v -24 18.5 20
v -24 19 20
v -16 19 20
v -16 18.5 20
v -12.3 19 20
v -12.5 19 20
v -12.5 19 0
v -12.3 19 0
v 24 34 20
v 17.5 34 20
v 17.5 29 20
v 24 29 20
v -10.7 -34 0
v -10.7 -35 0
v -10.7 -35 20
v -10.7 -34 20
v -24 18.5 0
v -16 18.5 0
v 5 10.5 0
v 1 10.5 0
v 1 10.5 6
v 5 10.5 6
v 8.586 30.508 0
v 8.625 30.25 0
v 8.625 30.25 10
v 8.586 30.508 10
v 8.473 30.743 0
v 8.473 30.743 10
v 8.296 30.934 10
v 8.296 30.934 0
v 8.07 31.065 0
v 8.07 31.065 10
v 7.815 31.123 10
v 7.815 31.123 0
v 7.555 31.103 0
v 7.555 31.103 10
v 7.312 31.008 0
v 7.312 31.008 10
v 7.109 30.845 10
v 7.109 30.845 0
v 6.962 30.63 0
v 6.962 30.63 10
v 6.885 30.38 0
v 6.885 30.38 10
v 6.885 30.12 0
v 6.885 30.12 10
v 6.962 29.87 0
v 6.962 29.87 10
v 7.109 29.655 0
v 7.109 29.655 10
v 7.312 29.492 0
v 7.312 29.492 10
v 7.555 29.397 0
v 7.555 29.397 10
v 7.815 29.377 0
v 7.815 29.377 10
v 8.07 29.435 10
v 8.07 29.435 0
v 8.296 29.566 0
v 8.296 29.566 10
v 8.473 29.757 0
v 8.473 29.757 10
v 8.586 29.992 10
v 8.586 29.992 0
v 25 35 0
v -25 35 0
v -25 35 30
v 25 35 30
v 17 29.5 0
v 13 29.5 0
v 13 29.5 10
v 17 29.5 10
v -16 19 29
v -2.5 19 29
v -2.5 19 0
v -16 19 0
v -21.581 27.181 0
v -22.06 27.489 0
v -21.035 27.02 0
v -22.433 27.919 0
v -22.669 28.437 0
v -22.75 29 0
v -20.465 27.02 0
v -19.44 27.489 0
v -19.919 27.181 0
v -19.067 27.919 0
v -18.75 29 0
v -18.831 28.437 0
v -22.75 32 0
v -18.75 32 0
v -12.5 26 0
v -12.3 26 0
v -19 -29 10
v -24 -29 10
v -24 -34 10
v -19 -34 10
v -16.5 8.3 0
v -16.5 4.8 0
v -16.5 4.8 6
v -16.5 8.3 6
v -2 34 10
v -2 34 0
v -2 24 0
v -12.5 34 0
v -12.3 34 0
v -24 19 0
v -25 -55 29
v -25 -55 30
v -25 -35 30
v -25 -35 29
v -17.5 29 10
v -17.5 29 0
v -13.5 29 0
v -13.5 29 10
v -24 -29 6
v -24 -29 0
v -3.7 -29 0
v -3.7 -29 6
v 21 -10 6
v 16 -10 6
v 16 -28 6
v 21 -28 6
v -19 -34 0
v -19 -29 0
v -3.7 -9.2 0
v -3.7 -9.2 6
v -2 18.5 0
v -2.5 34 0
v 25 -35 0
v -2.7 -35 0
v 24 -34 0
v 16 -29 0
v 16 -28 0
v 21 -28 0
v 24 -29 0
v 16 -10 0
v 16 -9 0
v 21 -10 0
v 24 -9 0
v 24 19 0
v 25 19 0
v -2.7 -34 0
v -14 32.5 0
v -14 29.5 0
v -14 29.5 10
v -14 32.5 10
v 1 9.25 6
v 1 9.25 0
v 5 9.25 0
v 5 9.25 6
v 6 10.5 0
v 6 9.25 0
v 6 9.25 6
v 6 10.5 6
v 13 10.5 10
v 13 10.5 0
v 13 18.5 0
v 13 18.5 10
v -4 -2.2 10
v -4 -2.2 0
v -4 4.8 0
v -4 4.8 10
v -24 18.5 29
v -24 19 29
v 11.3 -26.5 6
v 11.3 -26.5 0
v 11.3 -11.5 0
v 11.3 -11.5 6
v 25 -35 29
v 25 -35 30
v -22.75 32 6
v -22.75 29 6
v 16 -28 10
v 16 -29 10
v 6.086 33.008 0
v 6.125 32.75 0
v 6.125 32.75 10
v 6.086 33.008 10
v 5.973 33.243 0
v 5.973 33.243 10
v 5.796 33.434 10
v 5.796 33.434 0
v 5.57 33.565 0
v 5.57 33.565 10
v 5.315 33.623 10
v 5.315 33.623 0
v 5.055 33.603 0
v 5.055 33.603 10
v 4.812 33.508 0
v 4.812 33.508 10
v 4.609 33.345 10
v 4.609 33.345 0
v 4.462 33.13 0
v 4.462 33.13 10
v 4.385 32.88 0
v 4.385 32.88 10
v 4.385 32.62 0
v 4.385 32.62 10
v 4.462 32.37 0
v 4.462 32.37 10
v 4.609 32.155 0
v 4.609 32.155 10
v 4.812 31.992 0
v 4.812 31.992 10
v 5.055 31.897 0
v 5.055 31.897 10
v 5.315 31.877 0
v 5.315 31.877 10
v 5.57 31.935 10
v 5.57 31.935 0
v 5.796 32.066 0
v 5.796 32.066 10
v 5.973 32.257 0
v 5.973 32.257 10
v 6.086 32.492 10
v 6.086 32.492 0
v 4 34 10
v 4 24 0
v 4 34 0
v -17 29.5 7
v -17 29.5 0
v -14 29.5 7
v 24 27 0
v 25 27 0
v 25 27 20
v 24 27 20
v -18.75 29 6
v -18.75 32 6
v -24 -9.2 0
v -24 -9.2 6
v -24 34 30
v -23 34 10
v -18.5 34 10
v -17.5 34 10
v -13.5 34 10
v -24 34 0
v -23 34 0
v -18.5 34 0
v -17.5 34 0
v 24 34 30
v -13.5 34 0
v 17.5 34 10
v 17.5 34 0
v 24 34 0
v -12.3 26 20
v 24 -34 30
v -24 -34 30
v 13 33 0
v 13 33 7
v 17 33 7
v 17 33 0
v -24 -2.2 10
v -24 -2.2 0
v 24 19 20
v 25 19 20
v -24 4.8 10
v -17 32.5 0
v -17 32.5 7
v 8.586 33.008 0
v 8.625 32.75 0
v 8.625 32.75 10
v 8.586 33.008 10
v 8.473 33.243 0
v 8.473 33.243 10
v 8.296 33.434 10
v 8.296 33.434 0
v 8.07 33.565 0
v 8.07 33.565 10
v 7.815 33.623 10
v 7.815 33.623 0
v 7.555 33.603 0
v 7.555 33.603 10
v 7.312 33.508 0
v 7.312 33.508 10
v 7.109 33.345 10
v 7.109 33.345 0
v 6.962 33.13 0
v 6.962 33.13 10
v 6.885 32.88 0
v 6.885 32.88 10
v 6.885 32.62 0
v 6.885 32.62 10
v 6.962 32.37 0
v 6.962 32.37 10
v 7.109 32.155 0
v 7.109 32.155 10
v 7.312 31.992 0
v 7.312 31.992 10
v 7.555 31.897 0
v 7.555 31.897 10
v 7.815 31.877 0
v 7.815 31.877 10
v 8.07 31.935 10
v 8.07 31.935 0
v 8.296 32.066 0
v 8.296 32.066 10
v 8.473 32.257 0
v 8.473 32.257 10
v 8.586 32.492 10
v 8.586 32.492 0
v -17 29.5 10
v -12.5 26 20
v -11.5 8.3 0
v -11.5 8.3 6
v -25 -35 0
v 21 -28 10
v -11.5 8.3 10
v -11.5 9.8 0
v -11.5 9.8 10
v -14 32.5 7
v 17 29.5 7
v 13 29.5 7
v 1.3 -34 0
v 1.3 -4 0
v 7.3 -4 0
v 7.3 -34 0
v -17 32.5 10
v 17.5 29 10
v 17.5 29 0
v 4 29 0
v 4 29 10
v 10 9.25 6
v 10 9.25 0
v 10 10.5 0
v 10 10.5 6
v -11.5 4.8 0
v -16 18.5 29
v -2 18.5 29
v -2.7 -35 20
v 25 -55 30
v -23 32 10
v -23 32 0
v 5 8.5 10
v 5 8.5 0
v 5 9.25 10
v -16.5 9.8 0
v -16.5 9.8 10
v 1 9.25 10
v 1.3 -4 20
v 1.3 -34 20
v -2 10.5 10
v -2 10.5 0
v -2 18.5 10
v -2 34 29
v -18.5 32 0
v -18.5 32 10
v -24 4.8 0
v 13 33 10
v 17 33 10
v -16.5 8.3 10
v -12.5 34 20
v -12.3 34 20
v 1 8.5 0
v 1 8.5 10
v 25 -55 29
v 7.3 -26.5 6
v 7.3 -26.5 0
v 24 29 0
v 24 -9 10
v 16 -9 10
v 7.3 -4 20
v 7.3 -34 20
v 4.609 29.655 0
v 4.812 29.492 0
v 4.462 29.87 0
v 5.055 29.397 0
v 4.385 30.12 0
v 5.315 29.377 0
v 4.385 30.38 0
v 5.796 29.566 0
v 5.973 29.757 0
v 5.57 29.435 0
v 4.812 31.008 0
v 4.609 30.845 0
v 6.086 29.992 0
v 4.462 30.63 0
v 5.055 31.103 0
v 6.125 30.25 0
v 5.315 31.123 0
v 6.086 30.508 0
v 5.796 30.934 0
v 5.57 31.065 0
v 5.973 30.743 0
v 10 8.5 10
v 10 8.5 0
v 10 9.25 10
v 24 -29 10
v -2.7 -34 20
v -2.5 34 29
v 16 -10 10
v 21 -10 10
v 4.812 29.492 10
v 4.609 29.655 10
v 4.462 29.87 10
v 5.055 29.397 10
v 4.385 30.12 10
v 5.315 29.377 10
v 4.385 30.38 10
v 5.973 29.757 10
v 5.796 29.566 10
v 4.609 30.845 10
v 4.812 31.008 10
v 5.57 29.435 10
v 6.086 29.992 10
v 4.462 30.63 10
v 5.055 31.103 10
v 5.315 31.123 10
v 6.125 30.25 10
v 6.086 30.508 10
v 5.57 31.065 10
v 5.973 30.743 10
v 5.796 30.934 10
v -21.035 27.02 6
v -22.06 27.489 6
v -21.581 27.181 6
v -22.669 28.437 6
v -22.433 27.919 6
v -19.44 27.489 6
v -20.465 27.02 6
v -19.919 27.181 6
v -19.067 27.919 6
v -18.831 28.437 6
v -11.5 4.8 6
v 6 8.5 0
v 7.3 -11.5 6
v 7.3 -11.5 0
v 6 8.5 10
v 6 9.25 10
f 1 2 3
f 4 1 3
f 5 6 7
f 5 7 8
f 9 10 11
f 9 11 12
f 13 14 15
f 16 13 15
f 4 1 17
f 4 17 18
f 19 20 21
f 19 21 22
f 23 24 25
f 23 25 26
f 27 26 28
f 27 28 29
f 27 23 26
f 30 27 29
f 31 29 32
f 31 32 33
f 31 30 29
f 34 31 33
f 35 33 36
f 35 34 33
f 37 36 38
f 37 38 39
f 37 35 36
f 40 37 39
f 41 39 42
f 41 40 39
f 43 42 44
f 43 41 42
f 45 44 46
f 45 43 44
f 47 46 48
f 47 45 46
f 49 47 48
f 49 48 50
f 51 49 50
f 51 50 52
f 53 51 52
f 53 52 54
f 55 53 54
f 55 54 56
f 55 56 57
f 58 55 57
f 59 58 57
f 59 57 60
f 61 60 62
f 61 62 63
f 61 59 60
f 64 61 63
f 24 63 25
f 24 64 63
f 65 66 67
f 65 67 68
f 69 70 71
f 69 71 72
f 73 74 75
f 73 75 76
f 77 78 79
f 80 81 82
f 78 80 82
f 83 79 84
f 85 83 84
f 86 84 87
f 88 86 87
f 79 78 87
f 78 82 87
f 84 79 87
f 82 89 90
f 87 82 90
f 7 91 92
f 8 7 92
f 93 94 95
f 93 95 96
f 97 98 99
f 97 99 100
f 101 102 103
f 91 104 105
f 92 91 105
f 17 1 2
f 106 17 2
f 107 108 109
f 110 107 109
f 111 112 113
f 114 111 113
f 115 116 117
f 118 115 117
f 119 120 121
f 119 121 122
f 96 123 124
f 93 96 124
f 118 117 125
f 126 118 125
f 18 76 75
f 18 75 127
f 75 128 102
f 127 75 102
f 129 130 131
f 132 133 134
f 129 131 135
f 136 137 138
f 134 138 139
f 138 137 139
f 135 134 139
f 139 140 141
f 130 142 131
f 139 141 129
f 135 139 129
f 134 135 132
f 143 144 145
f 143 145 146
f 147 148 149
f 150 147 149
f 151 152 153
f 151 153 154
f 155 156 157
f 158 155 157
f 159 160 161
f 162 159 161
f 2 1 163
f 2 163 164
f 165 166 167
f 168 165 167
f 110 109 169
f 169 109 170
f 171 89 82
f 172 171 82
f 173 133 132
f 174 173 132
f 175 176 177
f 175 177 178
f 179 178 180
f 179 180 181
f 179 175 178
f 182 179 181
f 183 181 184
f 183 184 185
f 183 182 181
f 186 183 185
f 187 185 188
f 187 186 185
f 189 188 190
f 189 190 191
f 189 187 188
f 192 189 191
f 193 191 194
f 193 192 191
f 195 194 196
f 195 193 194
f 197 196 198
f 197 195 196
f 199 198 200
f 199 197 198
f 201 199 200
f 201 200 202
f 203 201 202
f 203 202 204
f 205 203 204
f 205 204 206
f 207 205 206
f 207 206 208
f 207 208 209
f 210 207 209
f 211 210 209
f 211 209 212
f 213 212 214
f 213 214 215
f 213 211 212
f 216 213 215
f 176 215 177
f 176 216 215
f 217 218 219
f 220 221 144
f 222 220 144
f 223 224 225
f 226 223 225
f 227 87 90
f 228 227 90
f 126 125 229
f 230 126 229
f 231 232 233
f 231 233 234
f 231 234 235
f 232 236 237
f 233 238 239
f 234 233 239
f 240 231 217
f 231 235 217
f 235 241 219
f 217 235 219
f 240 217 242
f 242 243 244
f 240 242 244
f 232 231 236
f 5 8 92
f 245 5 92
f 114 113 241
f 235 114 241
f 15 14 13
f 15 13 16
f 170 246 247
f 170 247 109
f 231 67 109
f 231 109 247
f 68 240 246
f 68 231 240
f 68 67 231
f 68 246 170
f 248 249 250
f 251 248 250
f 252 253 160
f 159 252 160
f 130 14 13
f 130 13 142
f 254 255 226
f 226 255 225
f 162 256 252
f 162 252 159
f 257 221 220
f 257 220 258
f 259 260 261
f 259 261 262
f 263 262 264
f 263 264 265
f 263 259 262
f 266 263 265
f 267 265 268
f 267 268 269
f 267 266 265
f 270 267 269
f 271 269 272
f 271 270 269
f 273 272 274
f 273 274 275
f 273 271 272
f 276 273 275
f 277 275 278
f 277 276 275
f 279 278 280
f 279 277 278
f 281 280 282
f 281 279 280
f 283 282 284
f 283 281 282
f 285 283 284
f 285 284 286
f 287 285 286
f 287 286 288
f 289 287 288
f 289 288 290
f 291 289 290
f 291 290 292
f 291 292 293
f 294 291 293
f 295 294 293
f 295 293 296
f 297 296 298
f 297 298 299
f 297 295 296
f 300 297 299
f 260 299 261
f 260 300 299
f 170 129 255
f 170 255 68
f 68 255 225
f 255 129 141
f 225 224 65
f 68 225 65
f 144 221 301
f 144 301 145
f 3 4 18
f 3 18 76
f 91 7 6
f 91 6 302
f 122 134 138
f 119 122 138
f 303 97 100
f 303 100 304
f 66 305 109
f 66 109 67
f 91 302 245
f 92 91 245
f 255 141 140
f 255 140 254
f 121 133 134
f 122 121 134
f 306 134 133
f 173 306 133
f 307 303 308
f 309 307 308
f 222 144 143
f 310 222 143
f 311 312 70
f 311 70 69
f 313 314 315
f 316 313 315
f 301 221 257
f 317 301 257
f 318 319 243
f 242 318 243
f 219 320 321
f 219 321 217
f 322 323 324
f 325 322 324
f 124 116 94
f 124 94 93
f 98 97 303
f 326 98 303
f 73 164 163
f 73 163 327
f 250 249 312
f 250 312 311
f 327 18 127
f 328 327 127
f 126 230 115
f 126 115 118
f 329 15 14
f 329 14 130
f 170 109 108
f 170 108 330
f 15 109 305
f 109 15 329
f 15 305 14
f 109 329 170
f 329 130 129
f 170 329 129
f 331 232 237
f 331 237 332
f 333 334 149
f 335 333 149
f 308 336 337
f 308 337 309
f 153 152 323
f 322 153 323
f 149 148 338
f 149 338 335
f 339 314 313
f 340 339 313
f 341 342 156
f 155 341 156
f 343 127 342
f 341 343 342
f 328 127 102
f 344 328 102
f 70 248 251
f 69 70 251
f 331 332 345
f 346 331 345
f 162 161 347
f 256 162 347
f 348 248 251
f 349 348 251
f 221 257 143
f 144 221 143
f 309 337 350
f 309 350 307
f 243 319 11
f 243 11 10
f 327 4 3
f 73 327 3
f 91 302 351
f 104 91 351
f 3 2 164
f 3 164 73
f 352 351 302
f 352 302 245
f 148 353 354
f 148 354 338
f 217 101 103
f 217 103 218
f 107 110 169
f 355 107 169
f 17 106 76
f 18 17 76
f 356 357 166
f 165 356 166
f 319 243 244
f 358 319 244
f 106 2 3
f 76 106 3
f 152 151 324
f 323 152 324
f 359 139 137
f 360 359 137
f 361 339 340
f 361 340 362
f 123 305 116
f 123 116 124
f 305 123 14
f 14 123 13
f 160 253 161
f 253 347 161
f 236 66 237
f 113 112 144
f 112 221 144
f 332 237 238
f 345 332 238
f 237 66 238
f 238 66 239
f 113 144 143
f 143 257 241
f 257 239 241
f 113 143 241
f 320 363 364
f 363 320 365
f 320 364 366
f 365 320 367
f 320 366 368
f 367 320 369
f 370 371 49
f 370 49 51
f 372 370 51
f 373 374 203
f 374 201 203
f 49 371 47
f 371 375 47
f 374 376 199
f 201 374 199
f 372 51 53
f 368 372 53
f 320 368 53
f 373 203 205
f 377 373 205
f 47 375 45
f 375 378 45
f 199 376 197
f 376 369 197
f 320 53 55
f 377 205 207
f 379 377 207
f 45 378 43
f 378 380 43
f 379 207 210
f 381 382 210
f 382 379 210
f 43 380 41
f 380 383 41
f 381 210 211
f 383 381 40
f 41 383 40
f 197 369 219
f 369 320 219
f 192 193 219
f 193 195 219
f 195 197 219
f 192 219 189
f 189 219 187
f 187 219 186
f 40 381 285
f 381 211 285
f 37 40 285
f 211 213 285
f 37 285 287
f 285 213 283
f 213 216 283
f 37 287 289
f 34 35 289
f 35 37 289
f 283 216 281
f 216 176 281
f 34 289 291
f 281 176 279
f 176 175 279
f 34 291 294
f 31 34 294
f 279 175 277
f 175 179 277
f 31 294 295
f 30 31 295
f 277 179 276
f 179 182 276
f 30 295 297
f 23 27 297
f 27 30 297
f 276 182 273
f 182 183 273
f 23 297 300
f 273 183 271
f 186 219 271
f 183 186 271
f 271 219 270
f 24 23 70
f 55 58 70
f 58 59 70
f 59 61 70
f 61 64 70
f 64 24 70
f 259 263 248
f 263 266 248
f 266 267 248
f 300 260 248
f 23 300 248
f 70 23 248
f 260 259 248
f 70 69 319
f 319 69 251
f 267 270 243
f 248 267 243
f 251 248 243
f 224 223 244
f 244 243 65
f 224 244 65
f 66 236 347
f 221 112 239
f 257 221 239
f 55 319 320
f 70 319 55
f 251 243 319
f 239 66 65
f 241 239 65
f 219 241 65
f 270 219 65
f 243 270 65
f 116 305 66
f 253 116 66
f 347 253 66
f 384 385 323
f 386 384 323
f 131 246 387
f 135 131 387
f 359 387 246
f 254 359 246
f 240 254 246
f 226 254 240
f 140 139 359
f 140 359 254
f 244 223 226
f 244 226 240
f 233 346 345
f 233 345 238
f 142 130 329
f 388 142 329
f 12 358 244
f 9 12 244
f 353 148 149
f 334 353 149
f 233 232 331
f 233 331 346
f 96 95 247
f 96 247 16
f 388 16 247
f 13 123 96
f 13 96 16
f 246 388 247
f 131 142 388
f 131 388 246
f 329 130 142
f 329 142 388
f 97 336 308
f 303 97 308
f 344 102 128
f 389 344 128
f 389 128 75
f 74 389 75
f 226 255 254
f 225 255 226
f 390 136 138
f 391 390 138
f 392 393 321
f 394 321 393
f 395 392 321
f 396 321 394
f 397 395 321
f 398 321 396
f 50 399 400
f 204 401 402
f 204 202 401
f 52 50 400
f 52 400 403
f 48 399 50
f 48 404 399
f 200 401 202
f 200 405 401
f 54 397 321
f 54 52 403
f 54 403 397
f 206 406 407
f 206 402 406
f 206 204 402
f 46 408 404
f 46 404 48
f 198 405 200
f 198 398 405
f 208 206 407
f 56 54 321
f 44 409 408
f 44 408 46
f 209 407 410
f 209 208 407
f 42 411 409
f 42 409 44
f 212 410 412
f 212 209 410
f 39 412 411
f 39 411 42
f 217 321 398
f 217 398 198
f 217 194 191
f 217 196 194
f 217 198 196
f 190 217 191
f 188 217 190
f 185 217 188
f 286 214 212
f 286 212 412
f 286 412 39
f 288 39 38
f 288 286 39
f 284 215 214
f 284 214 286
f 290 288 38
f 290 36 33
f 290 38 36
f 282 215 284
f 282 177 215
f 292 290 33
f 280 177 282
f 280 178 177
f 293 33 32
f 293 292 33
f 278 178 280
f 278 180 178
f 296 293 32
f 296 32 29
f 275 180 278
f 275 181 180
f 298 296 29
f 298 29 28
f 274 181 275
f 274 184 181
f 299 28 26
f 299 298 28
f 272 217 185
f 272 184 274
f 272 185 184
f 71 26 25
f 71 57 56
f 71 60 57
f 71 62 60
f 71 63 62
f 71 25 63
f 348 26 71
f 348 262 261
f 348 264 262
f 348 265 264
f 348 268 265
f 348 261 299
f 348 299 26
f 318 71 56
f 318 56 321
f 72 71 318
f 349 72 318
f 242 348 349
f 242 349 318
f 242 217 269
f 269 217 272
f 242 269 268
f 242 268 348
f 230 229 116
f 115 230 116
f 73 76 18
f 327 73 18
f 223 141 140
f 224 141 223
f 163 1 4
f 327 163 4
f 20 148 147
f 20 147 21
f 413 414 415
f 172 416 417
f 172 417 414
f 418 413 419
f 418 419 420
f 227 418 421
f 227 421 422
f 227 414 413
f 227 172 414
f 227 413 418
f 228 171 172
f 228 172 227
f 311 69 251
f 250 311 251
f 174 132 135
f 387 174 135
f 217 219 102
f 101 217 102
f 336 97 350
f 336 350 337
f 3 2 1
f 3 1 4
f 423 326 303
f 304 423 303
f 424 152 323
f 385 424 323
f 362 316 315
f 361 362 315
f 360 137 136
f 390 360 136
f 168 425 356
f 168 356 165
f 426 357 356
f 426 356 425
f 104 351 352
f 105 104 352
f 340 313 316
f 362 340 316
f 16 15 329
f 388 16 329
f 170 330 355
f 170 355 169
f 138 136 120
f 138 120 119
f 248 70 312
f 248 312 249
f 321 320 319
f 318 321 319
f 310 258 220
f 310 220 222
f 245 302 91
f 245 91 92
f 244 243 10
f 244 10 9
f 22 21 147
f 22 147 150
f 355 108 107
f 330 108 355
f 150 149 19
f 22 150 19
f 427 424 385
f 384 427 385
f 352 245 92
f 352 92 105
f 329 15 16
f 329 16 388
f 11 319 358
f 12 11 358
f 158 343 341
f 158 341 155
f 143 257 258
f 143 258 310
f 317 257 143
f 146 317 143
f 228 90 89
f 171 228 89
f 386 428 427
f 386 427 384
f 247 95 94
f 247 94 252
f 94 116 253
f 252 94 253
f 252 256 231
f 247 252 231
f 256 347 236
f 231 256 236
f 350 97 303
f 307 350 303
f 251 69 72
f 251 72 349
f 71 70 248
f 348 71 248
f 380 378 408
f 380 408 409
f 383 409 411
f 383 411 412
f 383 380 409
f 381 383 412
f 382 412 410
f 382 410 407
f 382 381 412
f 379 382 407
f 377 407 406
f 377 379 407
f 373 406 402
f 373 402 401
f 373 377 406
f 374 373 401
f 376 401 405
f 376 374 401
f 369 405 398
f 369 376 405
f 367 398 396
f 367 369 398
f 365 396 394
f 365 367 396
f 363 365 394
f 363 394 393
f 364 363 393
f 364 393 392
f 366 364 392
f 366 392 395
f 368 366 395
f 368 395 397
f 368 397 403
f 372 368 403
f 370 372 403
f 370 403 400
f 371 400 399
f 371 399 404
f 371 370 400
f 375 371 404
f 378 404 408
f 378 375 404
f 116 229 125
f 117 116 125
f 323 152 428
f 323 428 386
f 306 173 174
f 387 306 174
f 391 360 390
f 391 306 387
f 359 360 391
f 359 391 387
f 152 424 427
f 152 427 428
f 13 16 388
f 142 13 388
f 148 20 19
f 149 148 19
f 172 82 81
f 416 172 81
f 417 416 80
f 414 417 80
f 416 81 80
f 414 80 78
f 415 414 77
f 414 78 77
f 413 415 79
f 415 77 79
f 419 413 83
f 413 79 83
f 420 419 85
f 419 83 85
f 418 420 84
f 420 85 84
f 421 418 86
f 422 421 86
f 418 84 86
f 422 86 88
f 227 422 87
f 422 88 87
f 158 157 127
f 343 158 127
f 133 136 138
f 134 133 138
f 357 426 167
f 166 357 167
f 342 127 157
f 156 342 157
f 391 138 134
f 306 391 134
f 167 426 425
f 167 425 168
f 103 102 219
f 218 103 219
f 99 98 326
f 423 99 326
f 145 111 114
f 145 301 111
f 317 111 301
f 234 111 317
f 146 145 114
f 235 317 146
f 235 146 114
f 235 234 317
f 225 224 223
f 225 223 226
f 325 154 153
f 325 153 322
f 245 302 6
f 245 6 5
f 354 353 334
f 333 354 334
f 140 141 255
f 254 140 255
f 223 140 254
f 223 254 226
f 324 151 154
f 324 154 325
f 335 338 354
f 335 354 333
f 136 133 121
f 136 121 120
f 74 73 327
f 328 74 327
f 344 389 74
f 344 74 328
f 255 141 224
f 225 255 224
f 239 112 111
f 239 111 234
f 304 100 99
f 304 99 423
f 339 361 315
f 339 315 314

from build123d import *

# Parameters (mm, degrees)
F0_W      = 50
F0_H      = 70
F1_DEPTH  = 30
F2_T      = -1
F4_DEPTH  = 10
F3_W      = 4
F3_H      = 0.75
F3_W_2    = 5
F3_H_2    = 1.5
F3_H_3    = 5
F3_W_3    = 3
F3_H_4    = 3
F3_W_4    = 8.5
F3_H_5    = 3.5
F3_R      = 0.875
F5_DEPTH  = 6
F3_H_6    = 1.25
F3_H_7    = 18
F3_H_8    = 15
F6_DEPTH  = 20
F3_W_5    = 6.5
F3_W_6    = 0.2
F3_H_9    = 7
F3_H_10   = 8
F7_DEPTH  = 20
F8_DEPTH  = 10
F9_SIZE   = 9.99999
F10_DEPTH = 7
F12_DEPTH = 29
F3_W_7    = 8
F3_H_11   = 0.5
F13_DEPTH = 29
F14_DEPTH = 20
F15_DEPTH = 20
F16_W     = 50
F16_H     = 20
F17_DEPTH = 1
F18_W     = 8
F18_H     = 20
F19_DEPTH = 1
F20_DEPTH = 1
F21_W     = 8
F21_H     = 20
F22_DEPTH = 1
F23_DEPTH = 1


# Not quite as in the source:
# - a fillet or chamfer is up to 0.001 mm smaller than in the source, because OpenCascade refuses the exact size
# - the program builds the solid bodies; features that only make, move or delete a surface that nothing else refers to are left out


with BuildPart() as f1:
    # F0 (on Top) → F1 (new body)
    with BuildSketch(Plane.XY):
        Rectangle(F0_W, F0_H)
    extrude(amount=F1_DEPTH)

    # F2
    f2_openings = [f1.faces().sort_by_distance(p)[0] for p in [
        (0, 0, 30),
        (0, 0, 0),
    ]]
    offset(amount=F2_T, openings=f2_openings)

    # F3 (on Top) → F4, piece 5 (join)
    with BuildSketch(Plane.XY):
        with Locations((-15.5, 31.5)):
            Rectangle(F3_W, F3_H_3)
        with Locations((-15.5, 31)):
            Rectangle(F3_W_3, F3_H_4, mode=Mode.SUBTRACT)
        Polygon((-23, 34), (-23, 32), (-22.75, 32), (-18.75, 32), (-18.5, 32), (-18.5, 34), align=None)
        Polygon((-16.5, 4.8), (-24, 4.8), (-24, -2.2), (-4, -2.2), (-4, 4.8), (-11.5, 4.8), align=None)
        with Locations((13.25, 31.5)):
            Rectangle(F3_W_4, F3_H_3)
        with Locations((15, 31.25)):
            Rectangle(F3_W, F3_H_5, mode=Mode.SUBTRACT)
        with Locations((-21.5, -31.5)):
            Rectangle(F3_W_2, F3_H_3)
        Polygon((24, -9), (16, -9), (16, -10), (21, -10), (21, -28), (16, -28), (16, -29), (24, -29), align=None)
        with Locations((6.5, 31.5)):
            Rectangle(F3_W_2, F3_H_3)
        with Locations((5.25, 30.25)):
            Circle(F3_R, mode=Mode.SUBTRACT)
        with Locations((5.25, 32.75)):
            Circle(F3_R, mode=Mode.SUBTRACT)
        with Locations((7.75, 30.25)):
            Circle(F3_R, mode=Mode.SUBTRACT)
        with Locations((7.75, 32.75)):
            Circle(F3_R, mode=Mode.SUBTRACT)
    extrude(amount=F4_DEPTH)

    # F18 (on face) → F19 (cut)
    with BuildSketch(Plane.YZ.offset(25)):
        with Locations((23, 10)):
            Rectangle(F18_W, F18_H)
    extrude(amount=-F19_DEPTH, mode=Mode.SUBTRACT)

    # F21 (on face) → F22 (cut)
    with BuildSketch(Plane.XZ.offset(35)):
        with Locations((-6.7, 10)):
            Rectangle(F21_W, F21_H)
    extrude(amount=-F22_DEPTH, mode=Mode.SUBTRACT)


with BuildPart() as f4:
    # F3 (on Top) → F4 (new body)
    with BuildSketch(Plane.XY):
        Polygon((13, 18.5), (-2, 18.5), (-2, 10.5), (1, 10.5), (5, 10.5), (6, 10.5), (10, 10.5), (13, 10.5), align=None)
    extrude(amount=F4_DEPTH)


with BuildPart() as f4b:
    # F3 (on Top) → F4, piece 2 (new body)
    with BuildSketch(Plane.XY):
        with Locations((3, 8.875)):
            Rectangle(F3_W, F3_H)
    extrude(amount=F4_DEPTH)


with BuildPart() as f4c:
    # F3 (on Top) → F4, piece 3 (new body)
    with BuildSketch(Plane.XY):
        with Locations((8, 8.875)):
            Rectangle(F3_W, F3_H)
    extrude(amount=F4_DEPTH)


with BuildPart() as f4d:
    # F3 (on Top) → F4, piece 4 (new body)
    with BuildSketch(Plane.XY):
        with Locations((-14, 9.05)):
            Rectangle(F3_W_2, F3_H_2)
    extrude(amount=F4_DEPTH)


with BuildPart() as f5:
    # F3 (on Top) → F5 (new body)
    with BuildSketch(Plane.XY):
        with Locations((-14, 6.55)):
            Rectangle(F3_W_2, F3_H_5)
    extrude(amount=F5_DEPTH)


with BuildPart() as f5b:
    # F3 (on Top) → F5, piece 2 (new body)
    with BuildSketch(Plane.XY):
        with Locations((3, 9.875)):
            Rectangle(F3_W, F3_H_6)
    extrude(amount=F5_DEPTH)


with BuildPart() as f5c:
    # F3 (on Top) → F5, piece 3 (new body)
    with BuildSketch(Plane.XY):
        with Locations((8, 9.875)):
            Rectangle(F3_W, F3_H_6)
    extrude(amount=F5_DEPTH)


with BuildPart() as f5d:
    # F3 (on Top) → F5, piece 4 (new body)
    with BuildSketch(Plane.XY):
        with Locations((18.5, -19)):
            Rectangle(F3_W_2, F3_H_7)
    extrude(amount=F5_DEPTH)


with BuildPart() as f5e:
    # F3 (on Top) → F5, piece 5 (new body)
    with BuildSketch(Plane.XY):
        with Locations((9.3, -19)):
            Rectangle(F3_W, F3_H_8)
    extrude(amount=F5_DEPTH)


with BuildPart() as f5f:
    # F3 (on Top) → F5, piece 6 (new body)
    with BuildSketch(Plane.XY):
        Polygon((-3.7, -9.2), (-24, -9.2), (-24, -29), (-19, -29), (-3.7, -29), align=None)
    extrude(amount=F5_DEPTH)


with BuildPart() as f5g:
    # F3 (on Top) → F5, piece 7 (new body)
    with BuildSketch(Plane.XY):
        with BuildLine():
            Line((-18.75, 32), (-22.75, 32))
            Line((-22.75, 32), (-22.75, 29))
            ThreePointArc((-22.75, 29), (-20.75, 27), (-18.75, 29))
            Line((-18.75, 29), (-18.75, 32))
        make_face()
    extrude(amount=F5_DEPTH)


with BuildPart() as f6:
    # F3 (on Top) → F6 (new body)
    with BuildSketch(Plane.XY):
        Polygon((7.3, -26.5), (7.3, -11.5), (7.3, -4), (1.3, -4), (1.3, -34), (7.3, -34), align=None)
    extrude(amount=F6_DEPTH)


with BuildPart() as f6b:
    # F3 (on Top) → F6, piece 2 (new body)
    with BuildSketch(Plane.XY):
        with Locations((20.75, 31.5)):
            Rectangle(F3_W_5, F3_H_3)
    extrude(amount=F6_DEPTH)


with BuildPart() as f6c:
    # F3 (on Top) → F6, piece 3 (new body)
    with BuildSketch(Plane.XY):
        with Locations((-12.4, 22.5)):
            Rectangle(F3_W_6, F3_H_9)
    extrude(amount=F6_DEPTH)


with BuildPart() as f7:
    # F3 (on Top) → F7 (new body)
    with BuildSketch(Plane.XY):
        with Locations((-12.4, 30)):
            Rectangle(F3_W_6, F3_H_10)
    extrude(amount=F7_DEPTH)


with BuildPart() as f8:
    # F3 (on Top) → F8 (new body)
    with BuildSketch(Plane.XY):
        Polygon((4, 29), (4, 34), (-2, 34), (-2, 24), (4, 24), align=None)
    extrude(amount=F8_DEPTH)

    # F9 (size 10 in the source; OpenCascade refuses exactly that, so slightly less here)
    f9_edges = [f8.edges().sort_by_distance(p)[0] for p in [
        (1, 24, 10),
    ]]
    chamfer(f9_edges, length=F9_SIZE)


with BuildPart() as f10:
    # F3 (on Top) → F10 (new body)
    with BuildSketch(Plane.XY):
        with Locations((-15.5, 31)):
            Rectangle(F3_W_3, F3_H_4)
    extrude(amount=F10_DEPTH)


with BuildPart() as f10b:
    # F3 (on Top) → F10, piece 2 (new body)
    with BuildSketch(Plane.XY):
        with Locations((15, 31.25)):
            Rectangle(F3_W, F3_H_5)
    extrude(amount=F10_DEPTH)


with BuildPart() as f12:
    # F3 (on Top) → F12 (new body)
    with BuildSketch(Plane.XY):
        Polygon((-2, 24), (-2, 34), (-2.5, 34), (-2.5, 19), (-12.3, 19), (-12.5, 19), (-16, 19), (-16, 18.5), (-2, 18.5), align=None)
    extrude(amount=F12_DEPTH)


with BuildPart() as f13:
    # F3 (on Top) → F13 (new body)
    with BuildSketch(Plane.XY):
        with Locations((-20, 18.75)):
            Rectangle(F3_W_7, F3_H_11)
    extrude(amount=F13_DEPTH)

    # F3 (on Top) → F14 (cut)
    with BuildSketch(Plane.XY):
        with Locations((-20, 18.75)):
            Rectangle(F3_W_7, F3_H_11)
    extrude(amount=F14_DEPTH, mode=Mode.SUBTRACT)


with BuildPart() as f15:
    # F3 (on Top) → F15 (new body)
    with BuildSketch(Plane.XY):
        with Locations((-20, 18.75)):
            Rectangle(F3_W_7, F3_H_11)
    extrude(amount=F15_DEPTH)


with BuildPart() as f17:
    # F16 (on face) → F17 (new body)
    with BuildSketch(Plane.XY.offset(30)):
        with Locations((0, -45)):
            Rectangle(F16_W, F16_H)
    extrude(amount=-F17_DEPTH)


with BuildPart() as f20:
    # F18 (on face) → F20 (new body)
    with BuildSketch(Plane.YZ.offset(25)):
        with Locations((23, 10)):
            Rectangle(F18_W, F18_H)
    extrude(amount=-F20_DEPTH)


with BuildPart() as f23:
    # F21 (on face) → F23 (new body)
    with BuildSketch(Plane.XZ.offset(35)):
        with Locations((-6.7, 10)):
            Rectangle(F21_W, F21_H)
    extrude(amount=-F23_DEPTH)


solid = Compound([f1.part, f4.part, f4b.part, f4c.part, f4d.part, f5.part, f5b.part, f5c.part, f5d.part, f5e.part, f5f.part, f5g.part, f6.part, f6b.part, f6c.part, f7.part, f8.part, f10.part, f10b.part, f12.part, f13.part, f15.part, f17.part, f20.part, f23.part])
